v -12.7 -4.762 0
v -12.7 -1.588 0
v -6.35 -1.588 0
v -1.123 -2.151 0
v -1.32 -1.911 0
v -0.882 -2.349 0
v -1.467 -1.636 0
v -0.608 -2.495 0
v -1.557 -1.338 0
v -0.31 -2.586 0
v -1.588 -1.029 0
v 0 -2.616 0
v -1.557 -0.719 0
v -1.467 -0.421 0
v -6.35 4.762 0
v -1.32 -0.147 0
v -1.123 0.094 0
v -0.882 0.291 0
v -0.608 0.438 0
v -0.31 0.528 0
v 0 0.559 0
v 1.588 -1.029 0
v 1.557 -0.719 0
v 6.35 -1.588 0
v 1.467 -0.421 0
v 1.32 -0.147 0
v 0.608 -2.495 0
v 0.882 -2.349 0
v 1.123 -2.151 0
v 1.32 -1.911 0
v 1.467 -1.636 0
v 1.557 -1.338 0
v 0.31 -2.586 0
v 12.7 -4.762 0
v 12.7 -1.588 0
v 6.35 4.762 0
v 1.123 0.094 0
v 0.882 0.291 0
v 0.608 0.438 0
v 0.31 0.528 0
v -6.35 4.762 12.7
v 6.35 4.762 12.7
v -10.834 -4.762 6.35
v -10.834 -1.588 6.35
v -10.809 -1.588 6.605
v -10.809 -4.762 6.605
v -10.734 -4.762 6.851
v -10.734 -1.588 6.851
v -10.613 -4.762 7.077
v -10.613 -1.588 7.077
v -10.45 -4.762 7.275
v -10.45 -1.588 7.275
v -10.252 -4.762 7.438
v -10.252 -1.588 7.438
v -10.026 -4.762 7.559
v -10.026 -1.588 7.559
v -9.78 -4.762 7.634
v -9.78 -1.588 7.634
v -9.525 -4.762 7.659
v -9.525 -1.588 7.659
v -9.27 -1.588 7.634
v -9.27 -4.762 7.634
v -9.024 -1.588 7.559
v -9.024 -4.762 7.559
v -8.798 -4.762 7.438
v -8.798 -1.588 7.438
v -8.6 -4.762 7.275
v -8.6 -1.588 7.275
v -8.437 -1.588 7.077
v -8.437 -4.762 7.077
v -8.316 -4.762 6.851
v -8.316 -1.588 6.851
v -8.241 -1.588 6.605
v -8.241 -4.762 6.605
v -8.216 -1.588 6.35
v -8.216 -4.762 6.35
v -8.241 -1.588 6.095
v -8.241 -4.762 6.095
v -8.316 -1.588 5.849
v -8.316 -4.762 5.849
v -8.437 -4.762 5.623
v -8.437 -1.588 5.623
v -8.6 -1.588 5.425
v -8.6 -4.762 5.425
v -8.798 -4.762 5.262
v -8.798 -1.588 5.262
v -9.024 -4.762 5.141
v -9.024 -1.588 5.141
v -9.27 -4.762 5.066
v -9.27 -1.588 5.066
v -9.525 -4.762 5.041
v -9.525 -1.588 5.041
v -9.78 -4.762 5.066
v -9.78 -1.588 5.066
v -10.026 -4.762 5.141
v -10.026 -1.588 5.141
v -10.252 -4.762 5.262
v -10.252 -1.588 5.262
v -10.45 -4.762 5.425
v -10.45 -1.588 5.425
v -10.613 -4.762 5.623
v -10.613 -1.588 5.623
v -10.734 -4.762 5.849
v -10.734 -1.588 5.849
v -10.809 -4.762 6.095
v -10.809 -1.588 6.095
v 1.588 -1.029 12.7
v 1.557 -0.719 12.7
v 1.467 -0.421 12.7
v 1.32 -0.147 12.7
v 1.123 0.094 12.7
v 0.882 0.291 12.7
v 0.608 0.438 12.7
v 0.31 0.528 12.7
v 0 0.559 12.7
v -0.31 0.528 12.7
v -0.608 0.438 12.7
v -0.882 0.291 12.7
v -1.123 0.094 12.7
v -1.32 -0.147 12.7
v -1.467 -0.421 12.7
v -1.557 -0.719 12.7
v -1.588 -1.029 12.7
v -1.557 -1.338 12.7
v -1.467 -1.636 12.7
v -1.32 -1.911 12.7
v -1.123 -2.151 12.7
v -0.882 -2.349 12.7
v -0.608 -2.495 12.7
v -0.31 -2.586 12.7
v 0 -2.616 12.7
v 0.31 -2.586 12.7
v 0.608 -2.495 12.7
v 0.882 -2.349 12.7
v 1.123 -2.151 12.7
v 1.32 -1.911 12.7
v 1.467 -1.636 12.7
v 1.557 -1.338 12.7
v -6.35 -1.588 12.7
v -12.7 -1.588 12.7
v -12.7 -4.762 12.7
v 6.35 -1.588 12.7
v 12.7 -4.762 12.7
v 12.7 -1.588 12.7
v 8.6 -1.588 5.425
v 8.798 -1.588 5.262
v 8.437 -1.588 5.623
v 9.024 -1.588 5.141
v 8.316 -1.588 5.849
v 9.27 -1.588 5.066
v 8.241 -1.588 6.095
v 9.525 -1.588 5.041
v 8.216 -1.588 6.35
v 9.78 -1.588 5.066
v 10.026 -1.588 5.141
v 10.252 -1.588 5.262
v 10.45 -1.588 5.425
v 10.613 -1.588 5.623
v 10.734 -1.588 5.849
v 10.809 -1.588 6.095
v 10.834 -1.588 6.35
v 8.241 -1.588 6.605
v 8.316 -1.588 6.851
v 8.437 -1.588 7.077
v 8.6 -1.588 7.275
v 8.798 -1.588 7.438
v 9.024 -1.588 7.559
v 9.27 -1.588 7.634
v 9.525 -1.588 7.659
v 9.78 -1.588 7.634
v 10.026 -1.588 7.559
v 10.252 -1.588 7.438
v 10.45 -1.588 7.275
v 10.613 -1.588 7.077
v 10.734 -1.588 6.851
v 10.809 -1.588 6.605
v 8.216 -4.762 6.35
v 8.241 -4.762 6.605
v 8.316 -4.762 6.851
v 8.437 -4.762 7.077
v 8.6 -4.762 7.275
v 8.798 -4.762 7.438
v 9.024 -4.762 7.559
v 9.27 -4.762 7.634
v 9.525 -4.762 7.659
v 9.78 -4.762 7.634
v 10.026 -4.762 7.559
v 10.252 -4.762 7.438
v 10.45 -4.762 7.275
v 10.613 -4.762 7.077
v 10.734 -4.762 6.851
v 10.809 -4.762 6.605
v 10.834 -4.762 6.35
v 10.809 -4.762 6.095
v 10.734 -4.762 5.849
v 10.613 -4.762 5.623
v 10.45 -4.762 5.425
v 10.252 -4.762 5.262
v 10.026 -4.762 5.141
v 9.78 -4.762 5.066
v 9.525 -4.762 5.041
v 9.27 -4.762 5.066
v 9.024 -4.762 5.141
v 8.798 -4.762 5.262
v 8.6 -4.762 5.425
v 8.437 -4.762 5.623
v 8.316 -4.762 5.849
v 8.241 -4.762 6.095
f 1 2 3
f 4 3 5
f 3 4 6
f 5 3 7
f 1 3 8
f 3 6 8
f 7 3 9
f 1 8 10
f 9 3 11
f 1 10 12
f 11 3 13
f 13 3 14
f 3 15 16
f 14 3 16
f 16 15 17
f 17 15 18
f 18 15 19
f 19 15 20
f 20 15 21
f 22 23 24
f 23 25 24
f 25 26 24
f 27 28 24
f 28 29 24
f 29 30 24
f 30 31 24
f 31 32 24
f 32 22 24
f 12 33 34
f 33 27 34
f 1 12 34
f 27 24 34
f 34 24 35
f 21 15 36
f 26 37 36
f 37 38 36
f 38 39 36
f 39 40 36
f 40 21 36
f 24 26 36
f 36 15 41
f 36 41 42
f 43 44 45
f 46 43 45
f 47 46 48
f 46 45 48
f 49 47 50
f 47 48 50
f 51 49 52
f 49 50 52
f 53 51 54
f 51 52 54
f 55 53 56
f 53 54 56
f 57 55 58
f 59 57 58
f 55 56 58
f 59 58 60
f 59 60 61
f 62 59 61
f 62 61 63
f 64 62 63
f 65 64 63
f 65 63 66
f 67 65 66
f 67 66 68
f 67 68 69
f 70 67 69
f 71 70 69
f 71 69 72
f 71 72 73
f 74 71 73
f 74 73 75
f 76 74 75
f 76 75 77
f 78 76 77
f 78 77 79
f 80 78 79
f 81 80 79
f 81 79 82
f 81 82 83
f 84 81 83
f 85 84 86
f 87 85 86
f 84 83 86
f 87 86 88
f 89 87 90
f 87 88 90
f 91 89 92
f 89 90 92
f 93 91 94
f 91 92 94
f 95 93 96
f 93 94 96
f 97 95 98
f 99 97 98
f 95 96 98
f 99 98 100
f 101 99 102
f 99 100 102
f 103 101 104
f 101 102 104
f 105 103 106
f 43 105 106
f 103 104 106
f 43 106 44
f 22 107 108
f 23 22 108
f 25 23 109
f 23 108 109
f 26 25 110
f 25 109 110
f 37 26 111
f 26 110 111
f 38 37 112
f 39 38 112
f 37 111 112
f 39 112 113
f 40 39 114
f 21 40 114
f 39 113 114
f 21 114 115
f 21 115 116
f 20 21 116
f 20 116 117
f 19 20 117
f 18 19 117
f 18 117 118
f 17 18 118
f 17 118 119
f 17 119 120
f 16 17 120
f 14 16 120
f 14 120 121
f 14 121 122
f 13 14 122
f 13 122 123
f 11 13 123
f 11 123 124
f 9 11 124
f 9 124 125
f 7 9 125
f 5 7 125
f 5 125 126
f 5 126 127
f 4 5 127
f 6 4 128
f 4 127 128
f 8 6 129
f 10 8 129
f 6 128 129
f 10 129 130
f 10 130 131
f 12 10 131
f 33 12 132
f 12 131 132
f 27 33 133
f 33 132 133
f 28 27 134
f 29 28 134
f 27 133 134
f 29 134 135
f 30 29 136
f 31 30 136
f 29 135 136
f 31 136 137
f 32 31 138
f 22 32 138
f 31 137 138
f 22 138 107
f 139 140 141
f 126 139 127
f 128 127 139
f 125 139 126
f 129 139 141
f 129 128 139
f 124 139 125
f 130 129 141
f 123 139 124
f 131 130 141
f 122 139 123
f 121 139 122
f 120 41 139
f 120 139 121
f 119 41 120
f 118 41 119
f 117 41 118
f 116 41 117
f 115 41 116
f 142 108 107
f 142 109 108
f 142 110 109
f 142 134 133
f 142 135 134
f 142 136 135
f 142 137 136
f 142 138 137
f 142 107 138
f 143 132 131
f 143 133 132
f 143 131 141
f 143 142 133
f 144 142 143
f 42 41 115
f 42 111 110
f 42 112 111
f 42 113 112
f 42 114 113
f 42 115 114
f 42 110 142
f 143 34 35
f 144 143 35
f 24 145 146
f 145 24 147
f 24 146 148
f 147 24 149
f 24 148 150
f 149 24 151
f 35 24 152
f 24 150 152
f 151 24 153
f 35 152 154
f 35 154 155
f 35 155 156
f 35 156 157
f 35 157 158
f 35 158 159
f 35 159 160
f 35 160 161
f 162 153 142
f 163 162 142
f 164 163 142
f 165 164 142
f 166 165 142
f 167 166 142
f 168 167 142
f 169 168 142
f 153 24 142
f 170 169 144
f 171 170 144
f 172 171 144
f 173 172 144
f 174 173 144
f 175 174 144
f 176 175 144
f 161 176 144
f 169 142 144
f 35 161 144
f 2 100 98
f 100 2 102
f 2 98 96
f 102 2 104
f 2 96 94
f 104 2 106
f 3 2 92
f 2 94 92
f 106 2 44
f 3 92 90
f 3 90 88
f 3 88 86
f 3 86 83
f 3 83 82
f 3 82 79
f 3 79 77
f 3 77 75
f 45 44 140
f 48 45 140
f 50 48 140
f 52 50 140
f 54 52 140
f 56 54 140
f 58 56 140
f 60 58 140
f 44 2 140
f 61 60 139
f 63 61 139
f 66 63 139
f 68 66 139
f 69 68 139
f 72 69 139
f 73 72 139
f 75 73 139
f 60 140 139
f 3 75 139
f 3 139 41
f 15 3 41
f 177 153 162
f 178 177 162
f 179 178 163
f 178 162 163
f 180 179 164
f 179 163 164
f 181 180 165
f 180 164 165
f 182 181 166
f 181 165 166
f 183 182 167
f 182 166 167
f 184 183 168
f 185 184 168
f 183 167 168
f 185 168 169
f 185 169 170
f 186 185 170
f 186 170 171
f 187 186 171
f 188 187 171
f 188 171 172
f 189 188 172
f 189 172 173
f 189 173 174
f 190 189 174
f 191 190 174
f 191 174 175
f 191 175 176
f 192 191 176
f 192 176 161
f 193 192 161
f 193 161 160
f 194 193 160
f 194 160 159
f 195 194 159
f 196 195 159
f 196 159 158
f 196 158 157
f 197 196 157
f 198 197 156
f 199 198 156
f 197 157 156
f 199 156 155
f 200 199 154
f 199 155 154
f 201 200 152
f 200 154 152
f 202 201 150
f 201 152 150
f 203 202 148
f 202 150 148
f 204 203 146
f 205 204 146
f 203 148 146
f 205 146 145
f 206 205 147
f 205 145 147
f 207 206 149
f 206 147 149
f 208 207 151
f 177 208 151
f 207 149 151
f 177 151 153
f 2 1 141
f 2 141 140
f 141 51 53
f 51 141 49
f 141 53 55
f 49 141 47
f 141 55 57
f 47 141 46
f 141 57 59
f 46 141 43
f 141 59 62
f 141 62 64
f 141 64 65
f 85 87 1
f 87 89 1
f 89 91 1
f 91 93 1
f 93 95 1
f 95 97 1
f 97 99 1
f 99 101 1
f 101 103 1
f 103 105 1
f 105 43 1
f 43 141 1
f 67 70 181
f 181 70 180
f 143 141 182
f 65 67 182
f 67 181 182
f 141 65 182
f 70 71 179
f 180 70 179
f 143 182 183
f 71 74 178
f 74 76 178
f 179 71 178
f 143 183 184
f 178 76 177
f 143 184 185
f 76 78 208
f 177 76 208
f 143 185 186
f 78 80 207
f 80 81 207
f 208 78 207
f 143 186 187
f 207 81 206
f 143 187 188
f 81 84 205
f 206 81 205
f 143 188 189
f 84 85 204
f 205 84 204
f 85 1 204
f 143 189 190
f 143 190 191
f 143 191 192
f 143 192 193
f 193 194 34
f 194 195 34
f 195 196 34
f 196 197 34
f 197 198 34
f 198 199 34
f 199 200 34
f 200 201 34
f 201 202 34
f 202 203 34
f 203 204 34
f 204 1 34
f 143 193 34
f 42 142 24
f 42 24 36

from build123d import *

# Parameters (mm, degrees)
SKETCH1_W           = 25.4
SKETCH1_H           = 9.525
BOSS_EXTRUDE1_DEPTH = 12.7
SKETCH2_R           = 1.5875
SKETCH2_W           = 6.35
SKETCH2_H           = 6.35
CUT_EXTRUDE1_DEPTH  = 19.581211108
SKETCH4_R           = 1.308790008
CUT_EXTRUDE2_DEPTH  = 20.05


with BuildPart() as part:
    # Sketch1 → Boss-Extrude1 (new body)
    with BuildSketch(Plane.XY):
        Rectangle(SKETCH1_W, SKETCH1_H)
    extrude(amount=BOSS_EXTRUDE1_DEPTH)

    # Sketch2 → Cut-Extrude1 (cut, through all)
    with BuildSketch(Plane.XY.offset(12.7)):
        with Locations((0, -1.0287)):
            Circle(SKETCH2_R)
        with Locations((-9.525, 1.5875)):
            Rectangle(SKETCH2_W, SKETCH2_H)
        with Locations((9.525, 1.5875)):
            Rectangle(SKETCH2_W, SKETCH2_H)
    extrude(amount=-CUT_EXTRUDE1_DEPTH, mode=Mode.SUBTRACT)

    # Sketch4 → Cut-Extrude2 (cut, through all)
    with BuildSketch(Plane(origin=(0, -1.5875, 0), x_dir=(1, 0, 0), z_dir=(0, 1, 0))):
        with Locations(Location((9.525, -6.35, 0), (0, 0, 180))):
            Circle(SKETCH4_R)
        with Locations(Location((-9.525, -6.35, 0), (0, 0, 180))):
            Circle(SKETCH4_R)
    extrude(amount=-CUT_EXTRUDE2_DEPTH, mode=Mode.SUBTRACT)


solid = part.part
